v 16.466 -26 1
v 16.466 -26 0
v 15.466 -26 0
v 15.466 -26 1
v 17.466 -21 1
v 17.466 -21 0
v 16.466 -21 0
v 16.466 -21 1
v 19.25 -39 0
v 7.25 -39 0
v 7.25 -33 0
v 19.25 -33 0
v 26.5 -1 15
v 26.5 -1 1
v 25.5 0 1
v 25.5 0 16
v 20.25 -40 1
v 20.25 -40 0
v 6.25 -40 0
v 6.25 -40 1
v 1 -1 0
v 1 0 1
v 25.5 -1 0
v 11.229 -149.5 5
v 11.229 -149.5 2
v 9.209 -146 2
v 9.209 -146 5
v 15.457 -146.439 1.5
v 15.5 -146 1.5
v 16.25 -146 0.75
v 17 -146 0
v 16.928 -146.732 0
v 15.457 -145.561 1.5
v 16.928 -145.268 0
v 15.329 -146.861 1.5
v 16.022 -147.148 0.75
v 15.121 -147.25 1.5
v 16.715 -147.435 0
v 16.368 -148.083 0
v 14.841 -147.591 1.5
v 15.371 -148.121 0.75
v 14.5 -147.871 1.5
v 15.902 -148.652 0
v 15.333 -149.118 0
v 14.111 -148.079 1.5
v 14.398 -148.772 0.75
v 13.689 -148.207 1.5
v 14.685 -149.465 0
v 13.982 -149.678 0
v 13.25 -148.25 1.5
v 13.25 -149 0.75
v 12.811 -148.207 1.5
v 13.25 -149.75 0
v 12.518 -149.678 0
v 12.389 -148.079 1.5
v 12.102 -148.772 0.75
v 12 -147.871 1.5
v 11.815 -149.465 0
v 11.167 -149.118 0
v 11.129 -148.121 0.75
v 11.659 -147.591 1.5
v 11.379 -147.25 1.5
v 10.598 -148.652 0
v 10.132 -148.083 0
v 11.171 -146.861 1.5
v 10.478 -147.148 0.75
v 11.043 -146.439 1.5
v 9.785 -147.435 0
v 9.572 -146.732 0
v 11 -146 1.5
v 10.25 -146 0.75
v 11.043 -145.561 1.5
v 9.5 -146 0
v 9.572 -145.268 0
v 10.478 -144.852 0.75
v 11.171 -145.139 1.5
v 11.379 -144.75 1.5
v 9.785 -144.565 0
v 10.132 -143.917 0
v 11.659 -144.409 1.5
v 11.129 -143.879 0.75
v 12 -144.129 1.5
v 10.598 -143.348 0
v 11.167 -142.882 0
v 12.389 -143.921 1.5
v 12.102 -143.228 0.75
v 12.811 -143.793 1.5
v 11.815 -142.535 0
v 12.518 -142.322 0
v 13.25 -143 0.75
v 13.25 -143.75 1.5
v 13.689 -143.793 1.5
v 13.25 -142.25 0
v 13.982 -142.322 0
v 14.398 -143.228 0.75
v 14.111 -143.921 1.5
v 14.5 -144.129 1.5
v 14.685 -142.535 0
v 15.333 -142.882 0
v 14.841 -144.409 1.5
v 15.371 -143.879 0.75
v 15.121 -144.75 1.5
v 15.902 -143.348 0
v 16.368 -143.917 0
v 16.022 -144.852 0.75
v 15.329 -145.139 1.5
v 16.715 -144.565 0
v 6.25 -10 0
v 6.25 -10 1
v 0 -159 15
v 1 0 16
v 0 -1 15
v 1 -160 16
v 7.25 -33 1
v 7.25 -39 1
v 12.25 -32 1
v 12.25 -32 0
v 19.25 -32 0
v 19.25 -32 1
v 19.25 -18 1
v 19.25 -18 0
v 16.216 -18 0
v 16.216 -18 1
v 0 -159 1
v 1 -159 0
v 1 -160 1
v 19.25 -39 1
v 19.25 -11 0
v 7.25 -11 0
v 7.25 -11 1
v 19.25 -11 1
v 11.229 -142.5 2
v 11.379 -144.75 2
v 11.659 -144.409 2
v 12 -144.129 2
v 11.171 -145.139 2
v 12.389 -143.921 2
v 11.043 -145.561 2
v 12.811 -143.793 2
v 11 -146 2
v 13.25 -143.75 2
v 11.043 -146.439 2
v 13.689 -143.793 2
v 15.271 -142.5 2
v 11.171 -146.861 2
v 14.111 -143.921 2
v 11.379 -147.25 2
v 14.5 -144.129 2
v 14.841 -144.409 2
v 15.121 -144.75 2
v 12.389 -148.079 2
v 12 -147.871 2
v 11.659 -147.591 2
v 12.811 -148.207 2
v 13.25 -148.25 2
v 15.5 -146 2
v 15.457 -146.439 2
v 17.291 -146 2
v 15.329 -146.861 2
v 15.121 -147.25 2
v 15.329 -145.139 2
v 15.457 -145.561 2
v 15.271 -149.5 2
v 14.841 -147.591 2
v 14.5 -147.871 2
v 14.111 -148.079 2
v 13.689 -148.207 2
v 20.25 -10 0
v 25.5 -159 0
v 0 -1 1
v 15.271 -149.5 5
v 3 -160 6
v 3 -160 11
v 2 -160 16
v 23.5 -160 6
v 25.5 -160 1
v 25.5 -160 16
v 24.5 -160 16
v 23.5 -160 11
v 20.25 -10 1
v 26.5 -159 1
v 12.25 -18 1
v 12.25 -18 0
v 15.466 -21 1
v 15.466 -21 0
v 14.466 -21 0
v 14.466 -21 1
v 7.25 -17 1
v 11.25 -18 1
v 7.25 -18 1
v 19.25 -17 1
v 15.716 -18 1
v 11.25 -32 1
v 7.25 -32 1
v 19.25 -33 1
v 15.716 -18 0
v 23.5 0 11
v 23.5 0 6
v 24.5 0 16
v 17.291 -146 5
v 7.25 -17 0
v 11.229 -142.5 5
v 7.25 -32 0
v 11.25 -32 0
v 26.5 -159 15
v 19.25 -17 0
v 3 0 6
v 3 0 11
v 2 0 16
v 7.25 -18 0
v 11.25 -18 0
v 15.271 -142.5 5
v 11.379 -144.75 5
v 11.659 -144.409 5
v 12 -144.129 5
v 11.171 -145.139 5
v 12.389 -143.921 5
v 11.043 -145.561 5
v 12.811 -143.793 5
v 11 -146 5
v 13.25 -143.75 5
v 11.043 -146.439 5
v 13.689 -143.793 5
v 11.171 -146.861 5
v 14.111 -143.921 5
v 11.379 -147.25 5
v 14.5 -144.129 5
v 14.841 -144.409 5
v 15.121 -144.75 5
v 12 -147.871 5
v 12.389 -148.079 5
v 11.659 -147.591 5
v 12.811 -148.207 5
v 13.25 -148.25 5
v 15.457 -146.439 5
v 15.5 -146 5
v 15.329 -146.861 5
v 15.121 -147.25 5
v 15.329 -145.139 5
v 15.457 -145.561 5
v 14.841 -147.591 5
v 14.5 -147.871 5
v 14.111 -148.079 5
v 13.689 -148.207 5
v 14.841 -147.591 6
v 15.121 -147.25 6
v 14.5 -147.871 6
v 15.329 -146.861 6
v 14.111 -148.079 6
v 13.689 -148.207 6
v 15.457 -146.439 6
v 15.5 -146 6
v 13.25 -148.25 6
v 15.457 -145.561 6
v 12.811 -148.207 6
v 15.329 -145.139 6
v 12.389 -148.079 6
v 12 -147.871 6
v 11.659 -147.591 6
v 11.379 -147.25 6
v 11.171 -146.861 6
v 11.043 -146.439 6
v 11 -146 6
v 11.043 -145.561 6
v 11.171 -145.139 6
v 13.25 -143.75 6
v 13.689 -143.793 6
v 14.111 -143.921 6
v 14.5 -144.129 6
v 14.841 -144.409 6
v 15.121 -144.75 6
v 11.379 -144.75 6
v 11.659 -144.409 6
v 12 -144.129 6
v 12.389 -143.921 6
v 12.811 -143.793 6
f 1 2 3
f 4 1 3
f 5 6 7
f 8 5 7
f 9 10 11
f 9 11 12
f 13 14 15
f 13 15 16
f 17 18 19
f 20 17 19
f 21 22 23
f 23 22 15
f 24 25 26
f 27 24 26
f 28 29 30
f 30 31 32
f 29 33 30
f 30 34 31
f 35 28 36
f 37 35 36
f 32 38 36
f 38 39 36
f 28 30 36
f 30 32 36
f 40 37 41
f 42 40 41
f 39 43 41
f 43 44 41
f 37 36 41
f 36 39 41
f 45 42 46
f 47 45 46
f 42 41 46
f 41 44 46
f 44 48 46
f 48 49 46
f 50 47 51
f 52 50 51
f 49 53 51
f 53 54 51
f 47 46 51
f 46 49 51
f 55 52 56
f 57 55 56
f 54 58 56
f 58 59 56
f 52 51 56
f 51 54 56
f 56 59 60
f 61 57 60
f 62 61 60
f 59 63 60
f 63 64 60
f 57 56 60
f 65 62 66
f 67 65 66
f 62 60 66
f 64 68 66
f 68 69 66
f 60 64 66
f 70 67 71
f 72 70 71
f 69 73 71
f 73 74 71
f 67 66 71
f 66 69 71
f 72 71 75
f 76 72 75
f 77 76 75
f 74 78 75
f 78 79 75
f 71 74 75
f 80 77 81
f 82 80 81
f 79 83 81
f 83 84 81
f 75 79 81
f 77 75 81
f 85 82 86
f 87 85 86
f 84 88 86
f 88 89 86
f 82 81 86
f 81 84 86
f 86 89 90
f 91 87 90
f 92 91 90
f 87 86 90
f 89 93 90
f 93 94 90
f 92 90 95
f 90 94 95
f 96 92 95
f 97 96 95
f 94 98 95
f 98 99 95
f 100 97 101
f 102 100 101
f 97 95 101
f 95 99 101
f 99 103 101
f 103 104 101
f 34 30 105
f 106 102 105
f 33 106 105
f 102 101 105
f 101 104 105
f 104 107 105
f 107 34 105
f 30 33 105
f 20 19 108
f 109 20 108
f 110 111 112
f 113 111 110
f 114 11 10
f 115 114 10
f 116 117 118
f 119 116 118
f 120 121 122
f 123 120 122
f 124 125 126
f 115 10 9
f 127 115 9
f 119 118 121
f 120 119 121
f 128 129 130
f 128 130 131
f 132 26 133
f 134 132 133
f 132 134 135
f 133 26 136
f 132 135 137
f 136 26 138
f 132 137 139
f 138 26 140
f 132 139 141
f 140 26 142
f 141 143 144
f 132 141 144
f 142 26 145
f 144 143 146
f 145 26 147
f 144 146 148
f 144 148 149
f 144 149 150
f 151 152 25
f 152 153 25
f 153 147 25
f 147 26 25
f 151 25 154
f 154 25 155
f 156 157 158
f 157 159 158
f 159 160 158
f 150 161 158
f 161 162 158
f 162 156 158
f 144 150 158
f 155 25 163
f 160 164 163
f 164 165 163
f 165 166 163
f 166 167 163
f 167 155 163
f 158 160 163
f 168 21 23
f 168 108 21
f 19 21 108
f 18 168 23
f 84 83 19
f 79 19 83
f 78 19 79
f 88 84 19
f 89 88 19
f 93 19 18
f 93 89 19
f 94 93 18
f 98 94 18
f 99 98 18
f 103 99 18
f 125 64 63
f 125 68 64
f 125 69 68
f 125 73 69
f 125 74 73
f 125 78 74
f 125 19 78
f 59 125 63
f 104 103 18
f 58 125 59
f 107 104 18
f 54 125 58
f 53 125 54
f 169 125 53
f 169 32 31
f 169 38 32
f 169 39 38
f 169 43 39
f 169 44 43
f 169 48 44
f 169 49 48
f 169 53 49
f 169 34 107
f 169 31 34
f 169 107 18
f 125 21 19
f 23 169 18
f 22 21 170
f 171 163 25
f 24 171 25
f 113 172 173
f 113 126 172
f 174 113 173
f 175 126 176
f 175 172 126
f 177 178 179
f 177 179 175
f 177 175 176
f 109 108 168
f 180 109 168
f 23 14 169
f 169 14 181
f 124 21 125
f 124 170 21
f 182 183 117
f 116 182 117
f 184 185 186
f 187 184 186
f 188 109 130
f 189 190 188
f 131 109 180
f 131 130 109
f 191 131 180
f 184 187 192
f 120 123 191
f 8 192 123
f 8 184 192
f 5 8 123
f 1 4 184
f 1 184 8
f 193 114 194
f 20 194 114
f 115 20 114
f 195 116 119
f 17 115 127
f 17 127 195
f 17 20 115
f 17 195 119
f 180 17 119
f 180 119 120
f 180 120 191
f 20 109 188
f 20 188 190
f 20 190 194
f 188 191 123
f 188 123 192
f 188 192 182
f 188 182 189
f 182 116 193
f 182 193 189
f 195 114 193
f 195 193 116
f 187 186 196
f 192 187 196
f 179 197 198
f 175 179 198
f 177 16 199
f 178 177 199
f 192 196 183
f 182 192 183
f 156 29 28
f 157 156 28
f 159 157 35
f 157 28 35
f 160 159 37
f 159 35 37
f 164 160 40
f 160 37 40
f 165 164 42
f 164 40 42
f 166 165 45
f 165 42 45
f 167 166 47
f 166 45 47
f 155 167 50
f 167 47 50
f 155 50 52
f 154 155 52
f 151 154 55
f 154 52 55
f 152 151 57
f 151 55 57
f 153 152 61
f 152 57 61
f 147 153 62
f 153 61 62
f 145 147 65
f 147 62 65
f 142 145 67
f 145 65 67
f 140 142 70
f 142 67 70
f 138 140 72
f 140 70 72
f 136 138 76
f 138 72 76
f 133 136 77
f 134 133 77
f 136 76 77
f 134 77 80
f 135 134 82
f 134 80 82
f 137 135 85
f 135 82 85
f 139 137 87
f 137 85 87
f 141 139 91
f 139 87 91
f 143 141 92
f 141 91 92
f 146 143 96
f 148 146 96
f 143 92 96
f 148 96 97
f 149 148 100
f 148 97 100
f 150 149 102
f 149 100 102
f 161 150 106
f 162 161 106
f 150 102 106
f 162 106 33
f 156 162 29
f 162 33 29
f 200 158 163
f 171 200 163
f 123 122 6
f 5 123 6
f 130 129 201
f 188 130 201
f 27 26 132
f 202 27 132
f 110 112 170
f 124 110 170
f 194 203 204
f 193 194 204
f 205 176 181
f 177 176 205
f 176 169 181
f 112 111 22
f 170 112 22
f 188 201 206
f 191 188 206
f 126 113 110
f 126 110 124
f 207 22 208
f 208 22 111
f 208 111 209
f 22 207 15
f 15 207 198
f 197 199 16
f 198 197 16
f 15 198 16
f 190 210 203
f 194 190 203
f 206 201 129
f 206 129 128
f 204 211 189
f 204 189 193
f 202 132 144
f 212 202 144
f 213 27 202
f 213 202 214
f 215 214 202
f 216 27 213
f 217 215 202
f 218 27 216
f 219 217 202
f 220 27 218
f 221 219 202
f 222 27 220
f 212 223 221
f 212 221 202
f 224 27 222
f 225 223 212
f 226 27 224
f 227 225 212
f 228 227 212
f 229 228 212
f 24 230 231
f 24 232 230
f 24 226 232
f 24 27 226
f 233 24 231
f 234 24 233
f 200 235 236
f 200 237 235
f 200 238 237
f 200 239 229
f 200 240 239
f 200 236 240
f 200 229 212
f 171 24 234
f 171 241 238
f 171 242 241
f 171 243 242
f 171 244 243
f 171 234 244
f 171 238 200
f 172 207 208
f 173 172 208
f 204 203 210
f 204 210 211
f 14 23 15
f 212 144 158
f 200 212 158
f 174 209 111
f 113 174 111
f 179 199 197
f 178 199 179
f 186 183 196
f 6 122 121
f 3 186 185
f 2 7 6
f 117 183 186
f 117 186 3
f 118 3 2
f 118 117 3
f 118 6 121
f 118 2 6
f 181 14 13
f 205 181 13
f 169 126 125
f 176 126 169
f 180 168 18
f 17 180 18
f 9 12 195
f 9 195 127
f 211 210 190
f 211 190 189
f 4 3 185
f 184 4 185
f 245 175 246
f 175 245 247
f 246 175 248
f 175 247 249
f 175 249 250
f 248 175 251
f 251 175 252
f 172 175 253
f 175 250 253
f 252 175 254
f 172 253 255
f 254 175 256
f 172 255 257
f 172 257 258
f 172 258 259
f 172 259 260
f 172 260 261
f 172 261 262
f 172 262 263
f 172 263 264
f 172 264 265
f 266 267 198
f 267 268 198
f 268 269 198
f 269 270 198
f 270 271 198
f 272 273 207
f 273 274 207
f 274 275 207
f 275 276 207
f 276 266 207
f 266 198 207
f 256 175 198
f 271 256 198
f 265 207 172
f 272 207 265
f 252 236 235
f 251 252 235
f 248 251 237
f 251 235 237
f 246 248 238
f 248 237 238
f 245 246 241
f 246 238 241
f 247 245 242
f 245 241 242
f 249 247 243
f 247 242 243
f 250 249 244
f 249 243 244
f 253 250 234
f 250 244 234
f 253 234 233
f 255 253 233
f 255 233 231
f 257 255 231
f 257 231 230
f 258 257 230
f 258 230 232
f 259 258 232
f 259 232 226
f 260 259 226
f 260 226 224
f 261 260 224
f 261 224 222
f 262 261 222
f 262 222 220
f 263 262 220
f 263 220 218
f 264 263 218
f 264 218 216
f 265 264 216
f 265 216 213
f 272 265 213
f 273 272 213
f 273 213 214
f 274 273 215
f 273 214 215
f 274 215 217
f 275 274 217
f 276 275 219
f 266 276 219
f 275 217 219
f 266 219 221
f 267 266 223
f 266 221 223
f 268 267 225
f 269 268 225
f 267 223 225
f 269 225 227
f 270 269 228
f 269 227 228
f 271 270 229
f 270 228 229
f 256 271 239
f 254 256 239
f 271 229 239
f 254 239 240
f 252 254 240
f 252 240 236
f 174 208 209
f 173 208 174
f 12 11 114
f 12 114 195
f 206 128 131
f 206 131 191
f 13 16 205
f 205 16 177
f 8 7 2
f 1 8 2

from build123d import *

# Parameters (mm, degrees)
F1_DEPTH  = 160
F2_R      = 2.25
F3_DEPTH  = 16.001
F4_SIZE2  = 1
F4_SIZE   = 5
F5_SIZE2  = 5
F5_SIZE   = 1
F7_DEPTH  = 5
F8_R      = 2.25
F9_DEPTH  = 2
F10_SIZE  = 1.5
F11_SIZE  = 1
F12_W     = 12
F12_H     = 6
F12_W_2   = 4
F12_H_2   = 14
F13_DEPTH = 1


# Not quite as in the source:
# - a feature names something its author has since deleted; it is built from what else it names


with BuildPart() as f1:
    # F0 (on Front) → F1 (new body)
    with BuildSketch(Plane.XZ):
        Polygon((0, 16), (0, 0), (26.5, 0), (26.5, 16), (23.5, 16), (23.5, 6), (3, 6), (3, 16), align=None)
    extrude(amount=F1_DEPTH)

    # F2 (on face) → F3 (cut, through all)
    with BuildSketch(Plane(origin=(0, 0, 0), x_dir=(1, 0, 0), z_dir=(0, 0, -1))):
        with Locations((13.25, 146)):
            Circle(F2_R)
    extrude(amount=-F3_DEPTH, mode=Mode.SUBTRACT)

    # F4
    f4_edges = [f1.edges().sort_by_distance(p)[0] for p in [
        (23.5, -80, 16),
    ]]
    f4_side = f1.faces().sort_by_distance((23.5, -80, 11))[0]
    chamfer(f4_edges, length=F4_SIZE, length2=F4_SIZE2, reference=f4_side)

    # F5
    f5_edges = [f1.edges().sort_by_distance(p)[0] for p in [
        (3, -80, 16),
    ]]
    f5_side = f1.faces().sort_by_distance((1.5, -80, 16))[0]
    chamfer(f5_edges, length=F5_SIZE, length2=F5_SIZE2, reference=f5_side)

    # F6 (on face) → F7 (cut)
    with BuildSketch(Plane(origin=(0, 0, 0), x_dir=(1, 0, 0), z_dir=(0, 0, -1))):
        Polygon((15.2707259422, 149.5), (11.2292740578, 149.5), (9.2085481157, 146), (11.2292740578, 142.5), (15.2707259422, 142.5), (17.2914518843, 146), align=None)
    extrude(amount=-F7_DEPTH, mode=Mode.SUBTRACT)

    # F8 (on face) → F9 (join)
    with BuildSketch(Plane(origin=(0, 0, 0), x_dir=(1, 0, 0), z_dir=(0, 0, -1))):
        Polygon((15.2707259422, 149.5), (11.2292740578, 149.5), (9.2085481157, 146), (11.2292740578, 142.5), (15.2707259422, 142.5), (17.2914518843, 146), align=None)
        with Locations((13.25, 146)):
            Circle(F8_R, mode=Mode.SUBTRACT)
    extrude(amount=-F9_DEPTH)

    # F10
    f10_edges = [f1.edges().sort_by_distance(p)[0] for p in [
        (11, -146, 0),
    ]]
    chamfer(f10_edges, length=F10_SIZE)

    # F11
    f11_edges = [f1.edges().sort_by_distance(p)[0] for p in [
        (0, -80, 0),
        (13.25, 0, 0),
        (26.5, -80, 0),
        (13.25, -160, 0),
        (0, 0, 8),
        (26.5, 0, 8),
        (0, -160, 8),
        (26.5, -160, 8),
        (26.5, -80, 16),
        (0, -80, 16),
    ]]
    chamfer(f11_edges, length=F11_SIZE)

    # F12 (on face) → F13 (cut)
    with BuildSketch(Plane(origin=(0, 0, 0), x_dir=(1, 0, 0), z_dir=(0, 0, -1))):
        Polygon((6.25, 18), (6.25, 10), (20.25, 10), (20.25, 18), (20.25, 32), (20.25, 33), (20.25, 40), (6.25, 40), (6.25, 33), align=None)
        with Locations((13.25, 14)):
            Rectangle(F12_W, F12_H, mode=Mode.SUBTRACT)
        with Locations((9.25, 25)):
            Rectangle(F12_W_2, F12_H_2, mode=Mode.SUBTRACT)
        Polygon((15.7156598493, 18), (12.25, 18), (12.25, 32), (19.25, 32), (19.25, 18), (16.2156598493, 18), (17.4656598493, 21), (16.4656598493, 21), (16.4656598493, 26), (15.4656598493, 26), (15.4656598493, 21), (14.4656598493, 21), align=None, mode=Mode.SUBTRACT)
        with Locations((13.25, 36)):
            Rectangle(F12_W, F12_H, mode=Mode.SUBTRACT)
    extrude(amount=-F13_DEPTH, mode=Mode.SUBTRACT)


solid = f1.part
